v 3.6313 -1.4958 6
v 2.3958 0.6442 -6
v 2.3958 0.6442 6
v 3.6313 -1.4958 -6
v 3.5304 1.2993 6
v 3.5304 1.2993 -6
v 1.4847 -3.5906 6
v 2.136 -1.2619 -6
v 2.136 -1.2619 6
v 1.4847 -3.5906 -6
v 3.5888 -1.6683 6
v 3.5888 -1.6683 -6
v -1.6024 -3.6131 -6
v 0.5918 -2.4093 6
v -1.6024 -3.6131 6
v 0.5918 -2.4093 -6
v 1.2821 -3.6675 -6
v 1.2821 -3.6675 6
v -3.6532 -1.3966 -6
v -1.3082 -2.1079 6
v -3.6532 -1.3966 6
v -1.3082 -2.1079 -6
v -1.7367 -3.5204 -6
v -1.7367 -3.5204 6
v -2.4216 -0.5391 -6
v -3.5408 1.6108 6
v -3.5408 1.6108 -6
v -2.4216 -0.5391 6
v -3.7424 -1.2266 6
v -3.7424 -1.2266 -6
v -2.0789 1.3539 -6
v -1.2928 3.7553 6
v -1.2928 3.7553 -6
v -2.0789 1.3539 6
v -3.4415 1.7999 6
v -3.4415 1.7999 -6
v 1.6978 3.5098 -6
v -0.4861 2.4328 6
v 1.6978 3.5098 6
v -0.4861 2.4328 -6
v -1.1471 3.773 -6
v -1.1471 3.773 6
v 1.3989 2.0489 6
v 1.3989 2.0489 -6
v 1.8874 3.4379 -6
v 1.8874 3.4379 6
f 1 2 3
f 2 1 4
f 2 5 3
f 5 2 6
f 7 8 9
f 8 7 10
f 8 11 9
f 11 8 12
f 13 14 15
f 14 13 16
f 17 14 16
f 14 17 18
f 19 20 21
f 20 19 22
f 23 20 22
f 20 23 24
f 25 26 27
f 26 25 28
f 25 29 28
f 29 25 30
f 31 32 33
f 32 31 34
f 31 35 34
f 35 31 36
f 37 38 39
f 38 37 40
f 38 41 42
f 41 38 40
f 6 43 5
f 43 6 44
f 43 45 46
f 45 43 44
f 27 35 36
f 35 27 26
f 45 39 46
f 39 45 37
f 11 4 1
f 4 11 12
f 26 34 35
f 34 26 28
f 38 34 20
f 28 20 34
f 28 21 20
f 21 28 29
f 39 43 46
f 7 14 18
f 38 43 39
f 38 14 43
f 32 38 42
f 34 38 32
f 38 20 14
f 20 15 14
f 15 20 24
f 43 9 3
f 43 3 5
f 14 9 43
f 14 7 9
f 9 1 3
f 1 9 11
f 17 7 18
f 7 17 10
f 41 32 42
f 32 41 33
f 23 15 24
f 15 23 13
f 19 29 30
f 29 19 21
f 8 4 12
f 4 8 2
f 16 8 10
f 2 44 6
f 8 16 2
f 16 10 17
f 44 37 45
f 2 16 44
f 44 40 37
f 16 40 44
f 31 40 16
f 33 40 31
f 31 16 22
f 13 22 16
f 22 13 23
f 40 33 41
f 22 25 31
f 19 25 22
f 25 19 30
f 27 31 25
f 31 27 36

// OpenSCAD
size = 32;//block=32 //item=8


difference() {
  cylinder(h = size * 0.75 * 0.5, d = size * 0.25, center = true);

  union() {
    count = 8;
    for(i = [0:1:count - 1]) {
      rotate([365 / count * i, 90, 0]) {
        translate([0, 0, size * 0.15]) {
          rotate([150, 0, 0]) {
            cube([size * 0.5, size * 0.11, size * 0.11], center = true);
          }
          ;//rotate
        }
        ;//translate
      }
      ;//rotate
    }
    ;//for
  }
  ;//union

}
;//difference
